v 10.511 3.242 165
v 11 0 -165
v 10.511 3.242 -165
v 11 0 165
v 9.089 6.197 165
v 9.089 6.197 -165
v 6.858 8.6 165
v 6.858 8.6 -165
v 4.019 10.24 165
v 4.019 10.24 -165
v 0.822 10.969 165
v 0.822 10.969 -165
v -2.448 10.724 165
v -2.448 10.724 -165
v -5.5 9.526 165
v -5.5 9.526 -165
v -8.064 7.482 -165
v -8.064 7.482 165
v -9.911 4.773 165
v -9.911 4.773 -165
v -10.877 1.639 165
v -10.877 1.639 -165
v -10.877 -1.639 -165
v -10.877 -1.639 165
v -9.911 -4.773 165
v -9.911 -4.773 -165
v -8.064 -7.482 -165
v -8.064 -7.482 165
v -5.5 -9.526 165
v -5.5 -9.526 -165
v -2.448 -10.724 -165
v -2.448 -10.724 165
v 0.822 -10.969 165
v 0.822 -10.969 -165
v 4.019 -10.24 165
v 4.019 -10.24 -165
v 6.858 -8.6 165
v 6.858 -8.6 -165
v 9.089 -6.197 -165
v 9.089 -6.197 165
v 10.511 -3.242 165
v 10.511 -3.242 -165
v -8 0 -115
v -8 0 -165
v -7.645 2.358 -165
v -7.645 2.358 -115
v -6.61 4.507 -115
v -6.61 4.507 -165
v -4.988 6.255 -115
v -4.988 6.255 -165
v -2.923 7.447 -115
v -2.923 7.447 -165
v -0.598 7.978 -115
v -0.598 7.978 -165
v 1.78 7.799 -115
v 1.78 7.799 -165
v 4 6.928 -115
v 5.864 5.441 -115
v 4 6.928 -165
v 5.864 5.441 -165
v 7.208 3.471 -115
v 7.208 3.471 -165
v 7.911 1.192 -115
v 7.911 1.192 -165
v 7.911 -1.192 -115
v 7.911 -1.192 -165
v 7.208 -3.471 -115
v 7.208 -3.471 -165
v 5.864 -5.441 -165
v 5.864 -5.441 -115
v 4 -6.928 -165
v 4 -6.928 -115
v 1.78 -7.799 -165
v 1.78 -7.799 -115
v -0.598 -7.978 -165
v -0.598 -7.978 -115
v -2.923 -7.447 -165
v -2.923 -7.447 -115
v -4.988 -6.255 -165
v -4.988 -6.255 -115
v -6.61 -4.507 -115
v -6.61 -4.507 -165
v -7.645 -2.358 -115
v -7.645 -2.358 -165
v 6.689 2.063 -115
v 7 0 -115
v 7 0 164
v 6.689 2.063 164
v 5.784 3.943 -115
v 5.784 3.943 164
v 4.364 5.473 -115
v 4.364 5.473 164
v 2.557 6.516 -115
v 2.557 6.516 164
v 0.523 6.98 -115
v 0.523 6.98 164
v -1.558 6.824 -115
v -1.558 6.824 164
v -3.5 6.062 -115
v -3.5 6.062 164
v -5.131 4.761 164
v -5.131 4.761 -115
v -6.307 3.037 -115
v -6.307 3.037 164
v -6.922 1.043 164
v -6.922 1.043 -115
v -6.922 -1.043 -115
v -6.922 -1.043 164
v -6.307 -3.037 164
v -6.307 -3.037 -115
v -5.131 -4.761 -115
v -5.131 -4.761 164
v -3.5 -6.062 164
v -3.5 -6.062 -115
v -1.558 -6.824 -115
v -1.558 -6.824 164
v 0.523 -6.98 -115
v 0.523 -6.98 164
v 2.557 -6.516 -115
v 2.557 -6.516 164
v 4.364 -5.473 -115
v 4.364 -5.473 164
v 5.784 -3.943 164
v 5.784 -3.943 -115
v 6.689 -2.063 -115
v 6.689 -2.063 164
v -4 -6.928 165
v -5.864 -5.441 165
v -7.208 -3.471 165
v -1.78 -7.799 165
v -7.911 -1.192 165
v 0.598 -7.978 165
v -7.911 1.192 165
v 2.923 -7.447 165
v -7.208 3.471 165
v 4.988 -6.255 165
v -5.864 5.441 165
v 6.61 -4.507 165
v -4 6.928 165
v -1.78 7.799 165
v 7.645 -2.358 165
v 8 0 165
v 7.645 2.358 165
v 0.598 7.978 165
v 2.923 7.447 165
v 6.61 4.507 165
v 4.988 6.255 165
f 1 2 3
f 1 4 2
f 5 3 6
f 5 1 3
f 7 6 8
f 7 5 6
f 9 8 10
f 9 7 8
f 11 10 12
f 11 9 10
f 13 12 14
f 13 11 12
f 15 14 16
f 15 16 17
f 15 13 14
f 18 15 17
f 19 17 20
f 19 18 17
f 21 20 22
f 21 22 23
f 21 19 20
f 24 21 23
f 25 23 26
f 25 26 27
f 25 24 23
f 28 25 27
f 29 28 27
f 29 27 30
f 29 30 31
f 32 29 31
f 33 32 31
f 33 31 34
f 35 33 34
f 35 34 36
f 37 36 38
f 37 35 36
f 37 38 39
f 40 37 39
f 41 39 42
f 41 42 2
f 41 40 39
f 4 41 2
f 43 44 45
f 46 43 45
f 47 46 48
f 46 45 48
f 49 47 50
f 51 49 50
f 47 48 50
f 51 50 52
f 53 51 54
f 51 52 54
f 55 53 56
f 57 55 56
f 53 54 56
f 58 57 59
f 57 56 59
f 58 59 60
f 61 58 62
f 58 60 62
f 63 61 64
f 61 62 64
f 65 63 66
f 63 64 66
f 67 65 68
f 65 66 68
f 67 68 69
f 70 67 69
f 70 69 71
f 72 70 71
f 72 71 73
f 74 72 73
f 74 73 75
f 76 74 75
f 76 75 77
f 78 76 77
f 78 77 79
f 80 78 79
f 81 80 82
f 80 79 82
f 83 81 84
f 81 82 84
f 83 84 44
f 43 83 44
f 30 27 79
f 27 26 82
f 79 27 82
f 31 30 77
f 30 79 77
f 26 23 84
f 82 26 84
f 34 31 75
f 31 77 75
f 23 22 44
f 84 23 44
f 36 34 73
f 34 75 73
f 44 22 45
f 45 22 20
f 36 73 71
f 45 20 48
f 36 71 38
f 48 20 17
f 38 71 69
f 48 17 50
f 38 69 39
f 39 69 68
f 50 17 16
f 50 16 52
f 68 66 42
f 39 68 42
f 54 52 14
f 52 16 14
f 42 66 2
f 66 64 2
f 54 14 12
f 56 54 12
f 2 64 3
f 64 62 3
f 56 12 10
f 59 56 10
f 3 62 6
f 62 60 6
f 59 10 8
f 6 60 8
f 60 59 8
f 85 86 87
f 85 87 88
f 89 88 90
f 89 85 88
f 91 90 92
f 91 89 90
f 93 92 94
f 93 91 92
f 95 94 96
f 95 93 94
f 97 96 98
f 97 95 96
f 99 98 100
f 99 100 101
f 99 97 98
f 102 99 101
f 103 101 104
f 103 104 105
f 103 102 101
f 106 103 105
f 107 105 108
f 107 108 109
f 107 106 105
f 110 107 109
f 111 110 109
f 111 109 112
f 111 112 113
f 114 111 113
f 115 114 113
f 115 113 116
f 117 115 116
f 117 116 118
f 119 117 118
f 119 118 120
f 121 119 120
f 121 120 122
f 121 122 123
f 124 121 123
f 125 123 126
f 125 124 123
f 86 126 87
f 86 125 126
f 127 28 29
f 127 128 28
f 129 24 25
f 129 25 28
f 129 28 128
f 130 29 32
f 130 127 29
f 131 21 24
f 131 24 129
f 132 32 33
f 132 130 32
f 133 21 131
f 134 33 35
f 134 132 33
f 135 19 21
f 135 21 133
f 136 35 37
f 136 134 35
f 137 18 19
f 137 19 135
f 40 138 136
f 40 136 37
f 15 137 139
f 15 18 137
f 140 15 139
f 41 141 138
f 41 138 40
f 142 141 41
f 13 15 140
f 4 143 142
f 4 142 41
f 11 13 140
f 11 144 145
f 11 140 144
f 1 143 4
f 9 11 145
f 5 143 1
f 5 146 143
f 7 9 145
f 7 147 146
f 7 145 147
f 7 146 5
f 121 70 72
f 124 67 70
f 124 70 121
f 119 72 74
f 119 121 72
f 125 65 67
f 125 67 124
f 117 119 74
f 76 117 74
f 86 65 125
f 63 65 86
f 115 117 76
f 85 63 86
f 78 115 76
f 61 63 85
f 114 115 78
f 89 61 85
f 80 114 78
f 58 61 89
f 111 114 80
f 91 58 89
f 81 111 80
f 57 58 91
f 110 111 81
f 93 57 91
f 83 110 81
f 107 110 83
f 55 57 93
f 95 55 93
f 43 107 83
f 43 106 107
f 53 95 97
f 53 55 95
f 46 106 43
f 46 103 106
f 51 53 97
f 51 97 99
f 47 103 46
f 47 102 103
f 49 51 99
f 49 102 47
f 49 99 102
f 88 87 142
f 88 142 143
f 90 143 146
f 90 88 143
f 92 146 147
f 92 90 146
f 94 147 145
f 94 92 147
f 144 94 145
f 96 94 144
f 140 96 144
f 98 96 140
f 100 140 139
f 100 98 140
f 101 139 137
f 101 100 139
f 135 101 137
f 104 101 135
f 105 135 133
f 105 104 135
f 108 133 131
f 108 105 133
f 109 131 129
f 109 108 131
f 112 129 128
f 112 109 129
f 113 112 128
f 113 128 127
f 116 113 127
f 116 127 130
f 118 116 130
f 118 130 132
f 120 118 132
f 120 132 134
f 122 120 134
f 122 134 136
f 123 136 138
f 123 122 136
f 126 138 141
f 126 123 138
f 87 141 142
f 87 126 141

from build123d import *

# Parameters (mm, degrees)
SZKIC1_R                    = 11
SZKIC1_R_2                  = 7
DODANIE_WYCI_GNI_CIE1_DEPTH = 165
SZKIC2_R                    = 8
WYTNIJ_WYCI_GNI_CIE1_DEPTH  = 50
SFAZOWANIE1_SIZE            = 1


with BuildPart() as part:
    # Szkic1 → Dodanie-wyciągnięcie1 (new, symmetric)
    with BuildSketch(Plane.XY):
        Circle(SZKIC1_R)
        Circle(SZKIC1_R_2, mode=Mode.SUBTRACT)
    extrude(amount=DODANIE_WYCI_GNI_CIE1_DEPTH, both=True)

    # Szkic2 → Wytnij-wyciągnięcie1 (cut)
    with BuildSketch(Plane(origin=(0, 0, -165), x_dir=(-1, 0, 0), z_dir=(0, 0, -1))):
        Circle(SZKIC2_R)
    extrude(amount=-WYTNIJ_WYCI_GNI_CIE1_DEPTH, mode=Mode.SUBTRACT)

    # Sfazowanie1
    sfazowanie1_edges = [part.edges().sort_by_distance(p)[0] for p in [
        (-7, 0, 165),
    ]]
    chamfer(sfazowanie1_edges, length=SFAZOWANIE1_SIZE)


solid = part.part
